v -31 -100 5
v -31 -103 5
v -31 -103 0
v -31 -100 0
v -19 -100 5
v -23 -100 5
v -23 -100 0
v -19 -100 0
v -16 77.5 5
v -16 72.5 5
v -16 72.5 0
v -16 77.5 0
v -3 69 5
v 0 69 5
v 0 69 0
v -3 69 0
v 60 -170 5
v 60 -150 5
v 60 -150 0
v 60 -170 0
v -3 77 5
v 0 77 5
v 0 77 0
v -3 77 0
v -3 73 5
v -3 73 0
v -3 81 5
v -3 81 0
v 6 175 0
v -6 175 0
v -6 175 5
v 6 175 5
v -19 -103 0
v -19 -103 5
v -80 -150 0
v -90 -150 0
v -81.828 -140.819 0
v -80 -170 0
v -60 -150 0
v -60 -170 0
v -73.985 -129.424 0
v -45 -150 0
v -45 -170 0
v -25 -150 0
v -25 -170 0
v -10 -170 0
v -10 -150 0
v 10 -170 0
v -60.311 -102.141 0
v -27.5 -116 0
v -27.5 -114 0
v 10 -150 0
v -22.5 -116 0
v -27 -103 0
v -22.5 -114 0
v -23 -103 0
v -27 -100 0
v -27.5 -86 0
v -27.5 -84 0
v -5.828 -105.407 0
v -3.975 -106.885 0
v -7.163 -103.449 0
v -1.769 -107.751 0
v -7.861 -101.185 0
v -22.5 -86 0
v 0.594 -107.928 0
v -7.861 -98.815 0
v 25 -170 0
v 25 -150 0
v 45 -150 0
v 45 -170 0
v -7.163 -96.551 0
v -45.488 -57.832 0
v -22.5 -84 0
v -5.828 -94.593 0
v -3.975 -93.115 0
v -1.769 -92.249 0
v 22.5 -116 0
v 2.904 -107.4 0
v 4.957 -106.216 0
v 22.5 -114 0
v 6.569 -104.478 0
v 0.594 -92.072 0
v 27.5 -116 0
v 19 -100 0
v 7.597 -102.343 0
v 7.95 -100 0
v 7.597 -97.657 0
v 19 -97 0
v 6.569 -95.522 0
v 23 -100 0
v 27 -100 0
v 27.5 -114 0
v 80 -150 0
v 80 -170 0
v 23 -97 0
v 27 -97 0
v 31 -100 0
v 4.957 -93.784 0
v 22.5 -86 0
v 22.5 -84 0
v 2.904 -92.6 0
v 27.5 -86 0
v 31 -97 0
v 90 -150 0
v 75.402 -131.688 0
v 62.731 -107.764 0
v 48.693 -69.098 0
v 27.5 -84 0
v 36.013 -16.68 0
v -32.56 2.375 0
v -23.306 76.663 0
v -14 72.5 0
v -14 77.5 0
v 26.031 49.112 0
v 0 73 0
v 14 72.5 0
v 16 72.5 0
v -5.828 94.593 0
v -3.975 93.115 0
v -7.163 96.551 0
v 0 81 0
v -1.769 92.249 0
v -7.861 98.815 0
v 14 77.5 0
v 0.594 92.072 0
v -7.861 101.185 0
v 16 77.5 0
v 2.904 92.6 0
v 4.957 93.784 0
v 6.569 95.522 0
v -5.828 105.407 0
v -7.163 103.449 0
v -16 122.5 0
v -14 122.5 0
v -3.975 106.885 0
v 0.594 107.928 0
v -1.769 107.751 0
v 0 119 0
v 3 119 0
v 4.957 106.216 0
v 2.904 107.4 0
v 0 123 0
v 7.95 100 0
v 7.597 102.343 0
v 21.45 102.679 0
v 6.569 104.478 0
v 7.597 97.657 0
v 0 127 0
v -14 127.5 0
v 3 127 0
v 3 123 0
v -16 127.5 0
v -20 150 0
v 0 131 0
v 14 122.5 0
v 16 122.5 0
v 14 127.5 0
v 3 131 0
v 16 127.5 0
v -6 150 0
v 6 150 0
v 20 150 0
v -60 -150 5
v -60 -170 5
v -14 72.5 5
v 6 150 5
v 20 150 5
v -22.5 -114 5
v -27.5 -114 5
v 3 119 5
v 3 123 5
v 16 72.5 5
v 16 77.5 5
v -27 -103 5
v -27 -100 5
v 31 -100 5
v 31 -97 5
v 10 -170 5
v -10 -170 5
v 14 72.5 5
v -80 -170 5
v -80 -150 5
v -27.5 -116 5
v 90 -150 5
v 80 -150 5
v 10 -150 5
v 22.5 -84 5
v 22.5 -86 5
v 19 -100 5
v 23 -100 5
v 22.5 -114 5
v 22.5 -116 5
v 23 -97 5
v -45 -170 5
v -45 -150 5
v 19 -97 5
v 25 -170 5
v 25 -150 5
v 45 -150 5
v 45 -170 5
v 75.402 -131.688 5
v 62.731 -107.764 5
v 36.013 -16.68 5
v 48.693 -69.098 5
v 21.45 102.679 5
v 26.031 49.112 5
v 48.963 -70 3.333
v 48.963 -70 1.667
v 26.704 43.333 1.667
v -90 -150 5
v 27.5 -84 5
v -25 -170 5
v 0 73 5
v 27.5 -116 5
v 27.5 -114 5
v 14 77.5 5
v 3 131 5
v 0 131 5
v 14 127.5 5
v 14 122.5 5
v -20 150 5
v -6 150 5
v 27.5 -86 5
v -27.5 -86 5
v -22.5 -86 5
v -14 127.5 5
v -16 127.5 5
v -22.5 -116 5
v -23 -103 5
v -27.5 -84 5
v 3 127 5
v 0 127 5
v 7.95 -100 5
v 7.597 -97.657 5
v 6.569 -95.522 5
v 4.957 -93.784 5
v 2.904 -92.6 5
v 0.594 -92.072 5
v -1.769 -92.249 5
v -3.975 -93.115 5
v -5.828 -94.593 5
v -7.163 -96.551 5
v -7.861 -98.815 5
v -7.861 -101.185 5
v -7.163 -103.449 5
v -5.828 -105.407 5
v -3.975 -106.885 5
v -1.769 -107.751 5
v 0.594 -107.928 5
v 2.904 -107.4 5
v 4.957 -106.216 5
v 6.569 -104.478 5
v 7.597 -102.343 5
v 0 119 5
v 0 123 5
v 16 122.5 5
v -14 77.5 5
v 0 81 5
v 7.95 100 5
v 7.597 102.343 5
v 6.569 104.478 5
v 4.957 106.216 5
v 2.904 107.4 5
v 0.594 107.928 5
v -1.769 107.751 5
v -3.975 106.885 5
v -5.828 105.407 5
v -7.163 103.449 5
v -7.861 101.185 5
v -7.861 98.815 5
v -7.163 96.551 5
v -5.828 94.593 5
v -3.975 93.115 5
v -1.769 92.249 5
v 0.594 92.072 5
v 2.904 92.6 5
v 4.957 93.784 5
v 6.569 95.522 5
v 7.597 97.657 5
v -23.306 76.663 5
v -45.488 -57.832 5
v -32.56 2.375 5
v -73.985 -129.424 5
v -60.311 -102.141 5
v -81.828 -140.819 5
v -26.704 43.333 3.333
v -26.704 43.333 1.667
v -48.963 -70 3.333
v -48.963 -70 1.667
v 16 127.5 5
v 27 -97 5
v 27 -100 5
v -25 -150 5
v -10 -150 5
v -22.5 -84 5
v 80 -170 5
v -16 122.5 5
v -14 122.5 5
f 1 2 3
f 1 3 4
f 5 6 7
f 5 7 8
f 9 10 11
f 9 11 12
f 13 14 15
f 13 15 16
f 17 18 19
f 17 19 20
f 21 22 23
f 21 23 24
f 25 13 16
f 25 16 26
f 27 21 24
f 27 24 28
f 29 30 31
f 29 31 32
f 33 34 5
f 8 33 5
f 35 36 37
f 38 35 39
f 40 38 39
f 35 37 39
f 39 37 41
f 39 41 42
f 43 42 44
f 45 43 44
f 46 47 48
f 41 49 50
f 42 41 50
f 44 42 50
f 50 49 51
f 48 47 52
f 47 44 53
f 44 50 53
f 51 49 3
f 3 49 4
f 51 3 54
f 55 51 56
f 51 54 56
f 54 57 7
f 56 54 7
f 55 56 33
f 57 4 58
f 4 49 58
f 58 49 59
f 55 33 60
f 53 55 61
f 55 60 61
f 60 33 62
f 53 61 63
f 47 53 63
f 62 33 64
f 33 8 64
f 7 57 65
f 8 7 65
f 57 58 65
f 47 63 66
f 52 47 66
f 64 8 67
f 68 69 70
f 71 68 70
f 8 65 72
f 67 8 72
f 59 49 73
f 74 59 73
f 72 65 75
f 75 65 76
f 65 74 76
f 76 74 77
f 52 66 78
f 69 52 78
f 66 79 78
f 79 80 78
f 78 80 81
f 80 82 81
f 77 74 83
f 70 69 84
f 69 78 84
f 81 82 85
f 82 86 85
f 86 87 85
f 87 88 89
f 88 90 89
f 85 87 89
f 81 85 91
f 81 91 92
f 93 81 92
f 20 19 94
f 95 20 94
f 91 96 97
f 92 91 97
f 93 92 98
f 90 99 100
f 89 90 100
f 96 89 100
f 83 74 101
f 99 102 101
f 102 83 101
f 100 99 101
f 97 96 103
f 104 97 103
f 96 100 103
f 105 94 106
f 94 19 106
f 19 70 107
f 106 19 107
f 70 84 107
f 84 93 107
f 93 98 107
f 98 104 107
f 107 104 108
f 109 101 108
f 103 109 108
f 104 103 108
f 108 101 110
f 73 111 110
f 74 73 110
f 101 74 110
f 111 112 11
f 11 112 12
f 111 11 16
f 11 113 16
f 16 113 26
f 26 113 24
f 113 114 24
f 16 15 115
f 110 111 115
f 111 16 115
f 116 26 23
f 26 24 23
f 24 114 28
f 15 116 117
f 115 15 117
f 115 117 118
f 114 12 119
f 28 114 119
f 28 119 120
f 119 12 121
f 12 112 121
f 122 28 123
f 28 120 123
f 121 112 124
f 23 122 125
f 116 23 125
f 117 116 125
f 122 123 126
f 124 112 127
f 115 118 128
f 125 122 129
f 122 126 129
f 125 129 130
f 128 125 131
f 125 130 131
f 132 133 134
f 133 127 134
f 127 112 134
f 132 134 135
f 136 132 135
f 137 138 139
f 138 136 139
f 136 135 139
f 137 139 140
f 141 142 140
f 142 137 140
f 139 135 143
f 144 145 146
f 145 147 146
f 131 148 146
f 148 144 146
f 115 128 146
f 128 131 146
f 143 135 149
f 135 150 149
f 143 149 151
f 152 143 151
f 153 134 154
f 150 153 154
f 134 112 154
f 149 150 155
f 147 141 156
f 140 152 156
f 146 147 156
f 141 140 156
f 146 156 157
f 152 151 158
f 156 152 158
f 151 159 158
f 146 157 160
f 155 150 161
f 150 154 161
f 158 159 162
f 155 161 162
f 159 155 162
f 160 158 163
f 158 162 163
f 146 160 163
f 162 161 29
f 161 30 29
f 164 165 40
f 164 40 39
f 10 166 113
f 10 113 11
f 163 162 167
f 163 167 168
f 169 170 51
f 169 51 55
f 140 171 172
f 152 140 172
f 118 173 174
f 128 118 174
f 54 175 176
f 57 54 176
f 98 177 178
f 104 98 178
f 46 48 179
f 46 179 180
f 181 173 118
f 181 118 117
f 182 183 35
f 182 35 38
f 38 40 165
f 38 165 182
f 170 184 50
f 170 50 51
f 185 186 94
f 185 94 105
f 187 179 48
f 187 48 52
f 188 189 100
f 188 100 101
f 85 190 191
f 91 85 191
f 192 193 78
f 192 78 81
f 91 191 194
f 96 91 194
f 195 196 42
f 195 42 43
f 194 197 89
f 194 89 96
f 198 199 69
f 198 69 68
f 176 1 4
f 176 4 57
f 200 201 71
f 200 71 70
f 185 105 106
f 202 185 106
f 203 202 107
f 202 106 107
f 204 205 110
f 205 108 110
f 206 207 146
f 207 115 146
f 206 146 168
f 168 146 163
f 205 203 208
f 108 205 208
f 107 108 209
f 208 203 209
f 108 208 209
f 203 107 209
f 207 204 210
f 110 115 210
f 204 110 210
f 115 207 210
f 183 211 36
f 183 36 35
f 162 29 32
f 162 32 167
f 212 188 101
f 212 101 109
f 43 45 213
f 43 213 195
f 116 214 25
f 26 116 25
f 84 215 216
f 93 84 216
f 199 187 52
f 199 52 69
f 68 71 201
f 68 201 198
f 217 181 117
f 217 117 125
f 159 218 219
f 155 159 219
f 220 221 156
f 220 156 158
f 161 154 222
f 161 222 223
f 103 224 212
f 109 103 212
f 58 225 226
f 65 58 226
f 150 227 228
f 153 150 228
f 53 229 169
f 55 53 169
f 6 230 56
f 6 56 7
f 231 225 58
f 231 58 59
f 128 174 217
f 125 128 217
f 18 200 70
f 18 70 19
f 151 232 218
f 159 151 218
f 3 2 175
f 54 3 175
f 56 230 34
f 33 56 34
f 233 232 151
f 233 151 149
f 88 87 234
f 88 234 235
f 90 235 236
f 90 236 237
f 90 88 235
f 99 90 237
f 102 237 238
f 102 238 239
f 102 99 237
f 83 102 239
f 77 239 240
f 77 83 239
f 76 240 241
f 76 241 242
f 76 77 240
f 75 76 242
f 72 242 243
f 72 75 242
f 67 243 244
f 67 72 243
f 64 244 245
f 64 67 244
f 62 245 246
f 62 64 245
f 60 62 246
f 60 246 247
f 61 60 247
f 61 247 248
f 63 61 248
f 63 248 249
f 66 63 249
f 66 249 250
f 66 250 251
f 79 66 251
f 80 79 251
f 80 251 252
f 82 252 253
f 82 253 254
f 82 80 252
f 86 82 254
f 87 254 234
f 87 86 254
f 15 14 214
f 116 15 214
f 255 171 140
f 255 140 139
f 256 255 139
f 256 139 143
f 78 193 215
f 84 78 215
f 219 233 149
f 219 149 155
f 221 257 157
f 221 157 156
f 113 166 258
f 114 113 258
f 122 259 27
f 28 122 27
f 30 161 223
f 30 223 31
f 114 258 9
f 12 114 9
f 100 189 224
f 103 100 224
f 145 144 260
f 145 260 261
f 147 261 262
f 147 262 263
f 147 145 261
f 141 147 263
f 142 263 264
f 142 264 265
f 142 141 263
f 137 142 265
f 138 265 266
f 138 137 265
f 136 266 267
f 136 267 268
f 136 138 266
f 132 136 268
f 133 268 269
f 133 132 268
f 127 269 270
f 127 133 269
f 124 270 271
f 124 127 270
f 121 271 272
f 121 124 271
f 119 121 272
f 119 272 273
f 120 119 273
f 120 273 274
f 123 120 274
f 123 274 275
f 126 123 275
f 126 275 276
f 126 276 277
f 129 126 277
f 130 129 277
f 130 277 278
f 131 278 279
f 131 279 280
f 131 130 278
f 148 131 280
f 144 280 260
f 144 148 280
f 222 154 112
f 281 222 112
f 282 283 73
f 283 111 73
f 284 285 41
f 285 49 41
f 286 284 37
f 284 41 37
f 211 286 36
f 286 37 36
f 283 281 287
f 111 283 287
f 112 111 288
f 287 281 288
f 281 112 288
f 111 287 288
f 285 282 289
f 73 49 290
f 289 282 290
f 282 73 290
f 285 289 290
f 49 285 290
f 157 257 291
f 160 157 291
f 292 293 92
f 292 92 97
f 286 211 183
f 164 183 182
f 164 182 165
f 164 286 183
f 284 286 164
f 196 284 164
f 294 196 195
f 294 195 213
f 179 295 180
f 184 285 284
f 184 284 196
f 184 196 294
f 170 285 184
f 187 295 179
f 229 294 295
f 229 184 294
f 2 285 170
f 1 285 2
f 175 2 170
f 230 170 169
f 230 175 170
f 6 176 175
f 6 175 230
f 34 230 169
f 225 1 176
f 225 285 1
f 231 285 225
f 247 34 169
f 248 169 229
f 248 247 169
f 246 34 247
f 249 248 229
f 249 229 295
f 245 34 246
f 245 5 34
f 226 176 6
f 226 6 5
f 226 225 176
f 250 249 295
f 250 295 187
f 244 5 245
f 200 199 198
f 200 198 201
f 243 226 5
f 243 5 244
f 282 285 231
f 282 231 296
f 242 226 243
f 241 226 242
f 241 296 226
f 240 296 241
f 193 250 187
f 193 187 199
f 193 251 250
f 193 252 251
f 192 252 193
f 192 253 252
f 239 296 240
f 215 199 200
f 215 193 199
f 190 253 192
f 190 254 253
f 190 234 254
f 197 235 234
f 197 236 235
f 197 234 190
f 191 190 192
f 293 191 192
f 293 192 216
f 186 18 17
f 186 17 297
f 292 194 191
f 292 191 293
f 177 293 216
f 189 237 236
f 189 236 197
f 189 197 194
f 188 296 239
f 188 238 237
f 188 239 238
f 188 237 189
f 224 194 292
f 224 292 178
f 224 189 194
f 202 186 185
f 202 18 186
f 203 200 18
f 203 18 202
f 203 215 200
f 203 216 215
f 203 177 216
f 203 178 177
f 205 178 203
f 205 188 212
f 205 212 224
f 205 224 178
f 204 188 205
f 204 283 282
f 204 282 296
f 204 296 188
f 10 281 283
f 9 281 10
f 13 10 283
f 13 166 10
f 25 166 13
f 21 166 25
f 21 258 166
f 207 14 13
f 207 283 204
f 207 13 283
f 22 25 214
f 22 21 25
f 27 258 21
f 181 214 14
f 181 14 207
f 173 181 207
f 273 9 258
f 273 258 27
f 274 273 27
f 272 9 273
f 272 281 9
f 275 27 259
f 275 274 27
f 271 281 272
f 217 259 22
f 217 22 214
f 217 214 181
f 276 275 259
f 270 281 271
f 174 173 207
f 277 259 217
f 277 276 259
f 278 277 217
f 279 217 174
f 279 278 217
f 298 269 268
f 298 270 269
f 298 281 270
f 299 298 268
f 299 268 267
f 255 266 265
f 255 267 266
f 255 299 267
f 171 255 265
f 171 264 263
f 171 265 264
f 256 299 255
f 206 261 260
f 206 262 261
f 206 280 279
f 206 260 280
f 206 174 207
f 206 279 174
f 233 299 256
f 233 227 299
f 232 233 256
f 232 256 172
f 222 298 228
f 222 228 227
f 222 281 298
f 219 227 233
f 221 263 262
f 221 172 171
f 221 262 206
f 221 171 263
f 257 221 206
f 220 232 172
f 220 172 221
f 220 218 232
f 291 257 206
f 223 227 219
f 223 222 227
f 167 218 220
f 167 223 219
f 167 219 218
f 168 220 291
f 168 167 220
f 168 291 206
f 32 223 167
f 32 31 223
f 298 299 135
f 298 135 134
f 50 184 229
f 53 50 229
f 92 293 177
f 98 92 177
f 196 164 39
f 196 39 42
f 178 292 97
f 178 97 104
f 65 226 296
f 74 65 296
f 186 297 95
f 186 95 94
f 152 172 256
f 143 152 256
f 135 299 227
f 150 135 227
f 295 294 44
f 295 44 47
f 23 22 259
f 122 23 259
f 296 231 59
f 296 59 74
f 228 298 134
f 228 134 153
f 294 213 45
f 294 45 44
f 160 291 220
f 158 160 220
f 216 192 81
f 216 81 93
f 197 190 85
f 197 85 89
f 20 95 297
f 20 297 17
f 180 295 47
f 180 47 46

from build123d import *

# Parameters (mm, degrees)
SKETCH_R        = 7.95
PAD_DEPTH       = 5
SKETCH003_W     = 5
SKETCH003_H     = 2
SKETCH003_W_2   = 4
SKETCH003_H_2   = 3
POCKET_DEPTH    = 5.001
SKETCH002_W     = 5
SKETCH002_H     = 2
SKETCH002_W_2   = 4
SKETCH002_H_2   = 3
POCKET001_DEPTH = 5.001
POCKET002_DEPTH = 5.001


with BuildPart() as part:
    # Sketch → Pad (new body)
    with BuildSketch(Plane.XY):
        with BuildLine():
            add(Edge.make_bspline(
                [(-20, 150), (-20, 60), (-38.5, -100), (-90, -150)],
                knots=[0, 0, 0, 0, 1, 1, 1, 1], degree=3))
            Line((-20, 150), (-6, 150))
            Line((-6, 150), (-6, 175))
            Line((-6, 175), (6, 175))
            Line((6, 175), (6, 150))
            Line((6, 150), (20, 150))
            add(Edge.make_bspline(
                [(90, -150), (38.5, -100), (20, 60), (20, 150)],
                knots=[0, 0, 0, 0, 1, 1, 1, 1], degree=3))
            Line((90, -150), (90, -170))
            Line((90, -170), (-90, -170))
            Line((-90, -170), (-90, -150))
        make_face()
        with Locations((0, -100)):
            Circle(SKETCH_R, mode=Mode.SUBTRACT)
        with Locations((0, 100)):
            Circle(SKETCH_R, mode=Mode.SUBTRACT)
    extrude(amount=PAD_DEPTH)

    # Sketch003 (on Face28 of Pad) → Pocket (cut, through all)
    with BuildSketch(Plane(origin=(0, 100, 5), x_dir=(0, 1, 0), z_dir=(0, 0, 1))):
        with Locations((-25, 15)):
            Rectangle(SKETCH003_W, SKETCH003_H)
        with Locations((25, 15)):
            Rectangle(SKETCH003_W, SKETCH003_H)
        with Locations((25, -15)):
            Rectangle(SKETCH003_W, SKETCH003_H)
        with Locations((-25, -15)):
            Rectangle(SKETCH003_W, SKETCH003_H)
        with Locations((-29, 1.5)):
            Rectangle(SKETCH003_W_2, SKETCH003_H_2)
        with Locations((-21, 1.5)):
            Rectangle(SKETCH003_W_2, SKETCH003_H_2)
        with Locations((21, -1.5)):
            Rectangle(SKETCH003_W_2, SKETCH003_H_2)
        with Locations((29, -1.5)):
            Rectangle(SKETCH003_W_2, SKETCH003_H_2)
    extrude(amount=-POCKET_DEPTH, mode=Mode.SUBTRACT)

    # Sketch002 (on Face28 of Pad) → Pocket001 (cut, through all)
    with BuildSketch(Plane.XY.offset(5)):
        with Locations((-25, -85)):
            Rectangle(SKETCH002_W, SKETCH002_H)
        with Locations((25, -85)):
            Rectangle(SKETCH002_W, SKETCH002_H)
        with Locations((25, -115)):
            Rectangle(SKETCH002_W, SKETCH002_H)
        with Locations((-25, -115)):
            Rectangle(SKETCH002_W, SKETCH002_H)
        with Locations((21, -98.5)):
            Rectangle(SKETCH002_W_2, SKETCH002_H_2)
        with Locations((29, -98.5)):
            Rectangle(SKETCH002_W_2, SKETCH002_H_2)
        with Locations((-29, -101.5)):
            Rectangle(SKETCH002_W_2, SKETCH002_H_2)
        with Locations((-21, -101.5)):
            Rectangle(SKETCH002_W_2, SKETCH002_H_2)
    extrude(amount=-POCKET001_DEPTH, mode=Mode.SUBTRACT)

    # Sketch004 (on Face5 of Pocket001) → Pocket002 (cut, through all)
    with BuildSketch(Plane.XY.offset(5)):
        Polygon((-90, -150), (-80, -150), (-80, -170), (-60, -170), (-60, -150), (-45, -150), (-45, -170), (-25, -170), (-25, -150), (-10, -150), (-10, -170), (10, -170), (10, -150), (25, -150), (25, -170), (45, -170), (45, -150), (60, -150), (60, -170), (80, -170), (80, -150), (90, -150), (90, -180), (-90, -180), align=None)
    extrude(amount=-POCKET002_DEPTH, mode=Mode.SUBTRACT)


solid = part.part
